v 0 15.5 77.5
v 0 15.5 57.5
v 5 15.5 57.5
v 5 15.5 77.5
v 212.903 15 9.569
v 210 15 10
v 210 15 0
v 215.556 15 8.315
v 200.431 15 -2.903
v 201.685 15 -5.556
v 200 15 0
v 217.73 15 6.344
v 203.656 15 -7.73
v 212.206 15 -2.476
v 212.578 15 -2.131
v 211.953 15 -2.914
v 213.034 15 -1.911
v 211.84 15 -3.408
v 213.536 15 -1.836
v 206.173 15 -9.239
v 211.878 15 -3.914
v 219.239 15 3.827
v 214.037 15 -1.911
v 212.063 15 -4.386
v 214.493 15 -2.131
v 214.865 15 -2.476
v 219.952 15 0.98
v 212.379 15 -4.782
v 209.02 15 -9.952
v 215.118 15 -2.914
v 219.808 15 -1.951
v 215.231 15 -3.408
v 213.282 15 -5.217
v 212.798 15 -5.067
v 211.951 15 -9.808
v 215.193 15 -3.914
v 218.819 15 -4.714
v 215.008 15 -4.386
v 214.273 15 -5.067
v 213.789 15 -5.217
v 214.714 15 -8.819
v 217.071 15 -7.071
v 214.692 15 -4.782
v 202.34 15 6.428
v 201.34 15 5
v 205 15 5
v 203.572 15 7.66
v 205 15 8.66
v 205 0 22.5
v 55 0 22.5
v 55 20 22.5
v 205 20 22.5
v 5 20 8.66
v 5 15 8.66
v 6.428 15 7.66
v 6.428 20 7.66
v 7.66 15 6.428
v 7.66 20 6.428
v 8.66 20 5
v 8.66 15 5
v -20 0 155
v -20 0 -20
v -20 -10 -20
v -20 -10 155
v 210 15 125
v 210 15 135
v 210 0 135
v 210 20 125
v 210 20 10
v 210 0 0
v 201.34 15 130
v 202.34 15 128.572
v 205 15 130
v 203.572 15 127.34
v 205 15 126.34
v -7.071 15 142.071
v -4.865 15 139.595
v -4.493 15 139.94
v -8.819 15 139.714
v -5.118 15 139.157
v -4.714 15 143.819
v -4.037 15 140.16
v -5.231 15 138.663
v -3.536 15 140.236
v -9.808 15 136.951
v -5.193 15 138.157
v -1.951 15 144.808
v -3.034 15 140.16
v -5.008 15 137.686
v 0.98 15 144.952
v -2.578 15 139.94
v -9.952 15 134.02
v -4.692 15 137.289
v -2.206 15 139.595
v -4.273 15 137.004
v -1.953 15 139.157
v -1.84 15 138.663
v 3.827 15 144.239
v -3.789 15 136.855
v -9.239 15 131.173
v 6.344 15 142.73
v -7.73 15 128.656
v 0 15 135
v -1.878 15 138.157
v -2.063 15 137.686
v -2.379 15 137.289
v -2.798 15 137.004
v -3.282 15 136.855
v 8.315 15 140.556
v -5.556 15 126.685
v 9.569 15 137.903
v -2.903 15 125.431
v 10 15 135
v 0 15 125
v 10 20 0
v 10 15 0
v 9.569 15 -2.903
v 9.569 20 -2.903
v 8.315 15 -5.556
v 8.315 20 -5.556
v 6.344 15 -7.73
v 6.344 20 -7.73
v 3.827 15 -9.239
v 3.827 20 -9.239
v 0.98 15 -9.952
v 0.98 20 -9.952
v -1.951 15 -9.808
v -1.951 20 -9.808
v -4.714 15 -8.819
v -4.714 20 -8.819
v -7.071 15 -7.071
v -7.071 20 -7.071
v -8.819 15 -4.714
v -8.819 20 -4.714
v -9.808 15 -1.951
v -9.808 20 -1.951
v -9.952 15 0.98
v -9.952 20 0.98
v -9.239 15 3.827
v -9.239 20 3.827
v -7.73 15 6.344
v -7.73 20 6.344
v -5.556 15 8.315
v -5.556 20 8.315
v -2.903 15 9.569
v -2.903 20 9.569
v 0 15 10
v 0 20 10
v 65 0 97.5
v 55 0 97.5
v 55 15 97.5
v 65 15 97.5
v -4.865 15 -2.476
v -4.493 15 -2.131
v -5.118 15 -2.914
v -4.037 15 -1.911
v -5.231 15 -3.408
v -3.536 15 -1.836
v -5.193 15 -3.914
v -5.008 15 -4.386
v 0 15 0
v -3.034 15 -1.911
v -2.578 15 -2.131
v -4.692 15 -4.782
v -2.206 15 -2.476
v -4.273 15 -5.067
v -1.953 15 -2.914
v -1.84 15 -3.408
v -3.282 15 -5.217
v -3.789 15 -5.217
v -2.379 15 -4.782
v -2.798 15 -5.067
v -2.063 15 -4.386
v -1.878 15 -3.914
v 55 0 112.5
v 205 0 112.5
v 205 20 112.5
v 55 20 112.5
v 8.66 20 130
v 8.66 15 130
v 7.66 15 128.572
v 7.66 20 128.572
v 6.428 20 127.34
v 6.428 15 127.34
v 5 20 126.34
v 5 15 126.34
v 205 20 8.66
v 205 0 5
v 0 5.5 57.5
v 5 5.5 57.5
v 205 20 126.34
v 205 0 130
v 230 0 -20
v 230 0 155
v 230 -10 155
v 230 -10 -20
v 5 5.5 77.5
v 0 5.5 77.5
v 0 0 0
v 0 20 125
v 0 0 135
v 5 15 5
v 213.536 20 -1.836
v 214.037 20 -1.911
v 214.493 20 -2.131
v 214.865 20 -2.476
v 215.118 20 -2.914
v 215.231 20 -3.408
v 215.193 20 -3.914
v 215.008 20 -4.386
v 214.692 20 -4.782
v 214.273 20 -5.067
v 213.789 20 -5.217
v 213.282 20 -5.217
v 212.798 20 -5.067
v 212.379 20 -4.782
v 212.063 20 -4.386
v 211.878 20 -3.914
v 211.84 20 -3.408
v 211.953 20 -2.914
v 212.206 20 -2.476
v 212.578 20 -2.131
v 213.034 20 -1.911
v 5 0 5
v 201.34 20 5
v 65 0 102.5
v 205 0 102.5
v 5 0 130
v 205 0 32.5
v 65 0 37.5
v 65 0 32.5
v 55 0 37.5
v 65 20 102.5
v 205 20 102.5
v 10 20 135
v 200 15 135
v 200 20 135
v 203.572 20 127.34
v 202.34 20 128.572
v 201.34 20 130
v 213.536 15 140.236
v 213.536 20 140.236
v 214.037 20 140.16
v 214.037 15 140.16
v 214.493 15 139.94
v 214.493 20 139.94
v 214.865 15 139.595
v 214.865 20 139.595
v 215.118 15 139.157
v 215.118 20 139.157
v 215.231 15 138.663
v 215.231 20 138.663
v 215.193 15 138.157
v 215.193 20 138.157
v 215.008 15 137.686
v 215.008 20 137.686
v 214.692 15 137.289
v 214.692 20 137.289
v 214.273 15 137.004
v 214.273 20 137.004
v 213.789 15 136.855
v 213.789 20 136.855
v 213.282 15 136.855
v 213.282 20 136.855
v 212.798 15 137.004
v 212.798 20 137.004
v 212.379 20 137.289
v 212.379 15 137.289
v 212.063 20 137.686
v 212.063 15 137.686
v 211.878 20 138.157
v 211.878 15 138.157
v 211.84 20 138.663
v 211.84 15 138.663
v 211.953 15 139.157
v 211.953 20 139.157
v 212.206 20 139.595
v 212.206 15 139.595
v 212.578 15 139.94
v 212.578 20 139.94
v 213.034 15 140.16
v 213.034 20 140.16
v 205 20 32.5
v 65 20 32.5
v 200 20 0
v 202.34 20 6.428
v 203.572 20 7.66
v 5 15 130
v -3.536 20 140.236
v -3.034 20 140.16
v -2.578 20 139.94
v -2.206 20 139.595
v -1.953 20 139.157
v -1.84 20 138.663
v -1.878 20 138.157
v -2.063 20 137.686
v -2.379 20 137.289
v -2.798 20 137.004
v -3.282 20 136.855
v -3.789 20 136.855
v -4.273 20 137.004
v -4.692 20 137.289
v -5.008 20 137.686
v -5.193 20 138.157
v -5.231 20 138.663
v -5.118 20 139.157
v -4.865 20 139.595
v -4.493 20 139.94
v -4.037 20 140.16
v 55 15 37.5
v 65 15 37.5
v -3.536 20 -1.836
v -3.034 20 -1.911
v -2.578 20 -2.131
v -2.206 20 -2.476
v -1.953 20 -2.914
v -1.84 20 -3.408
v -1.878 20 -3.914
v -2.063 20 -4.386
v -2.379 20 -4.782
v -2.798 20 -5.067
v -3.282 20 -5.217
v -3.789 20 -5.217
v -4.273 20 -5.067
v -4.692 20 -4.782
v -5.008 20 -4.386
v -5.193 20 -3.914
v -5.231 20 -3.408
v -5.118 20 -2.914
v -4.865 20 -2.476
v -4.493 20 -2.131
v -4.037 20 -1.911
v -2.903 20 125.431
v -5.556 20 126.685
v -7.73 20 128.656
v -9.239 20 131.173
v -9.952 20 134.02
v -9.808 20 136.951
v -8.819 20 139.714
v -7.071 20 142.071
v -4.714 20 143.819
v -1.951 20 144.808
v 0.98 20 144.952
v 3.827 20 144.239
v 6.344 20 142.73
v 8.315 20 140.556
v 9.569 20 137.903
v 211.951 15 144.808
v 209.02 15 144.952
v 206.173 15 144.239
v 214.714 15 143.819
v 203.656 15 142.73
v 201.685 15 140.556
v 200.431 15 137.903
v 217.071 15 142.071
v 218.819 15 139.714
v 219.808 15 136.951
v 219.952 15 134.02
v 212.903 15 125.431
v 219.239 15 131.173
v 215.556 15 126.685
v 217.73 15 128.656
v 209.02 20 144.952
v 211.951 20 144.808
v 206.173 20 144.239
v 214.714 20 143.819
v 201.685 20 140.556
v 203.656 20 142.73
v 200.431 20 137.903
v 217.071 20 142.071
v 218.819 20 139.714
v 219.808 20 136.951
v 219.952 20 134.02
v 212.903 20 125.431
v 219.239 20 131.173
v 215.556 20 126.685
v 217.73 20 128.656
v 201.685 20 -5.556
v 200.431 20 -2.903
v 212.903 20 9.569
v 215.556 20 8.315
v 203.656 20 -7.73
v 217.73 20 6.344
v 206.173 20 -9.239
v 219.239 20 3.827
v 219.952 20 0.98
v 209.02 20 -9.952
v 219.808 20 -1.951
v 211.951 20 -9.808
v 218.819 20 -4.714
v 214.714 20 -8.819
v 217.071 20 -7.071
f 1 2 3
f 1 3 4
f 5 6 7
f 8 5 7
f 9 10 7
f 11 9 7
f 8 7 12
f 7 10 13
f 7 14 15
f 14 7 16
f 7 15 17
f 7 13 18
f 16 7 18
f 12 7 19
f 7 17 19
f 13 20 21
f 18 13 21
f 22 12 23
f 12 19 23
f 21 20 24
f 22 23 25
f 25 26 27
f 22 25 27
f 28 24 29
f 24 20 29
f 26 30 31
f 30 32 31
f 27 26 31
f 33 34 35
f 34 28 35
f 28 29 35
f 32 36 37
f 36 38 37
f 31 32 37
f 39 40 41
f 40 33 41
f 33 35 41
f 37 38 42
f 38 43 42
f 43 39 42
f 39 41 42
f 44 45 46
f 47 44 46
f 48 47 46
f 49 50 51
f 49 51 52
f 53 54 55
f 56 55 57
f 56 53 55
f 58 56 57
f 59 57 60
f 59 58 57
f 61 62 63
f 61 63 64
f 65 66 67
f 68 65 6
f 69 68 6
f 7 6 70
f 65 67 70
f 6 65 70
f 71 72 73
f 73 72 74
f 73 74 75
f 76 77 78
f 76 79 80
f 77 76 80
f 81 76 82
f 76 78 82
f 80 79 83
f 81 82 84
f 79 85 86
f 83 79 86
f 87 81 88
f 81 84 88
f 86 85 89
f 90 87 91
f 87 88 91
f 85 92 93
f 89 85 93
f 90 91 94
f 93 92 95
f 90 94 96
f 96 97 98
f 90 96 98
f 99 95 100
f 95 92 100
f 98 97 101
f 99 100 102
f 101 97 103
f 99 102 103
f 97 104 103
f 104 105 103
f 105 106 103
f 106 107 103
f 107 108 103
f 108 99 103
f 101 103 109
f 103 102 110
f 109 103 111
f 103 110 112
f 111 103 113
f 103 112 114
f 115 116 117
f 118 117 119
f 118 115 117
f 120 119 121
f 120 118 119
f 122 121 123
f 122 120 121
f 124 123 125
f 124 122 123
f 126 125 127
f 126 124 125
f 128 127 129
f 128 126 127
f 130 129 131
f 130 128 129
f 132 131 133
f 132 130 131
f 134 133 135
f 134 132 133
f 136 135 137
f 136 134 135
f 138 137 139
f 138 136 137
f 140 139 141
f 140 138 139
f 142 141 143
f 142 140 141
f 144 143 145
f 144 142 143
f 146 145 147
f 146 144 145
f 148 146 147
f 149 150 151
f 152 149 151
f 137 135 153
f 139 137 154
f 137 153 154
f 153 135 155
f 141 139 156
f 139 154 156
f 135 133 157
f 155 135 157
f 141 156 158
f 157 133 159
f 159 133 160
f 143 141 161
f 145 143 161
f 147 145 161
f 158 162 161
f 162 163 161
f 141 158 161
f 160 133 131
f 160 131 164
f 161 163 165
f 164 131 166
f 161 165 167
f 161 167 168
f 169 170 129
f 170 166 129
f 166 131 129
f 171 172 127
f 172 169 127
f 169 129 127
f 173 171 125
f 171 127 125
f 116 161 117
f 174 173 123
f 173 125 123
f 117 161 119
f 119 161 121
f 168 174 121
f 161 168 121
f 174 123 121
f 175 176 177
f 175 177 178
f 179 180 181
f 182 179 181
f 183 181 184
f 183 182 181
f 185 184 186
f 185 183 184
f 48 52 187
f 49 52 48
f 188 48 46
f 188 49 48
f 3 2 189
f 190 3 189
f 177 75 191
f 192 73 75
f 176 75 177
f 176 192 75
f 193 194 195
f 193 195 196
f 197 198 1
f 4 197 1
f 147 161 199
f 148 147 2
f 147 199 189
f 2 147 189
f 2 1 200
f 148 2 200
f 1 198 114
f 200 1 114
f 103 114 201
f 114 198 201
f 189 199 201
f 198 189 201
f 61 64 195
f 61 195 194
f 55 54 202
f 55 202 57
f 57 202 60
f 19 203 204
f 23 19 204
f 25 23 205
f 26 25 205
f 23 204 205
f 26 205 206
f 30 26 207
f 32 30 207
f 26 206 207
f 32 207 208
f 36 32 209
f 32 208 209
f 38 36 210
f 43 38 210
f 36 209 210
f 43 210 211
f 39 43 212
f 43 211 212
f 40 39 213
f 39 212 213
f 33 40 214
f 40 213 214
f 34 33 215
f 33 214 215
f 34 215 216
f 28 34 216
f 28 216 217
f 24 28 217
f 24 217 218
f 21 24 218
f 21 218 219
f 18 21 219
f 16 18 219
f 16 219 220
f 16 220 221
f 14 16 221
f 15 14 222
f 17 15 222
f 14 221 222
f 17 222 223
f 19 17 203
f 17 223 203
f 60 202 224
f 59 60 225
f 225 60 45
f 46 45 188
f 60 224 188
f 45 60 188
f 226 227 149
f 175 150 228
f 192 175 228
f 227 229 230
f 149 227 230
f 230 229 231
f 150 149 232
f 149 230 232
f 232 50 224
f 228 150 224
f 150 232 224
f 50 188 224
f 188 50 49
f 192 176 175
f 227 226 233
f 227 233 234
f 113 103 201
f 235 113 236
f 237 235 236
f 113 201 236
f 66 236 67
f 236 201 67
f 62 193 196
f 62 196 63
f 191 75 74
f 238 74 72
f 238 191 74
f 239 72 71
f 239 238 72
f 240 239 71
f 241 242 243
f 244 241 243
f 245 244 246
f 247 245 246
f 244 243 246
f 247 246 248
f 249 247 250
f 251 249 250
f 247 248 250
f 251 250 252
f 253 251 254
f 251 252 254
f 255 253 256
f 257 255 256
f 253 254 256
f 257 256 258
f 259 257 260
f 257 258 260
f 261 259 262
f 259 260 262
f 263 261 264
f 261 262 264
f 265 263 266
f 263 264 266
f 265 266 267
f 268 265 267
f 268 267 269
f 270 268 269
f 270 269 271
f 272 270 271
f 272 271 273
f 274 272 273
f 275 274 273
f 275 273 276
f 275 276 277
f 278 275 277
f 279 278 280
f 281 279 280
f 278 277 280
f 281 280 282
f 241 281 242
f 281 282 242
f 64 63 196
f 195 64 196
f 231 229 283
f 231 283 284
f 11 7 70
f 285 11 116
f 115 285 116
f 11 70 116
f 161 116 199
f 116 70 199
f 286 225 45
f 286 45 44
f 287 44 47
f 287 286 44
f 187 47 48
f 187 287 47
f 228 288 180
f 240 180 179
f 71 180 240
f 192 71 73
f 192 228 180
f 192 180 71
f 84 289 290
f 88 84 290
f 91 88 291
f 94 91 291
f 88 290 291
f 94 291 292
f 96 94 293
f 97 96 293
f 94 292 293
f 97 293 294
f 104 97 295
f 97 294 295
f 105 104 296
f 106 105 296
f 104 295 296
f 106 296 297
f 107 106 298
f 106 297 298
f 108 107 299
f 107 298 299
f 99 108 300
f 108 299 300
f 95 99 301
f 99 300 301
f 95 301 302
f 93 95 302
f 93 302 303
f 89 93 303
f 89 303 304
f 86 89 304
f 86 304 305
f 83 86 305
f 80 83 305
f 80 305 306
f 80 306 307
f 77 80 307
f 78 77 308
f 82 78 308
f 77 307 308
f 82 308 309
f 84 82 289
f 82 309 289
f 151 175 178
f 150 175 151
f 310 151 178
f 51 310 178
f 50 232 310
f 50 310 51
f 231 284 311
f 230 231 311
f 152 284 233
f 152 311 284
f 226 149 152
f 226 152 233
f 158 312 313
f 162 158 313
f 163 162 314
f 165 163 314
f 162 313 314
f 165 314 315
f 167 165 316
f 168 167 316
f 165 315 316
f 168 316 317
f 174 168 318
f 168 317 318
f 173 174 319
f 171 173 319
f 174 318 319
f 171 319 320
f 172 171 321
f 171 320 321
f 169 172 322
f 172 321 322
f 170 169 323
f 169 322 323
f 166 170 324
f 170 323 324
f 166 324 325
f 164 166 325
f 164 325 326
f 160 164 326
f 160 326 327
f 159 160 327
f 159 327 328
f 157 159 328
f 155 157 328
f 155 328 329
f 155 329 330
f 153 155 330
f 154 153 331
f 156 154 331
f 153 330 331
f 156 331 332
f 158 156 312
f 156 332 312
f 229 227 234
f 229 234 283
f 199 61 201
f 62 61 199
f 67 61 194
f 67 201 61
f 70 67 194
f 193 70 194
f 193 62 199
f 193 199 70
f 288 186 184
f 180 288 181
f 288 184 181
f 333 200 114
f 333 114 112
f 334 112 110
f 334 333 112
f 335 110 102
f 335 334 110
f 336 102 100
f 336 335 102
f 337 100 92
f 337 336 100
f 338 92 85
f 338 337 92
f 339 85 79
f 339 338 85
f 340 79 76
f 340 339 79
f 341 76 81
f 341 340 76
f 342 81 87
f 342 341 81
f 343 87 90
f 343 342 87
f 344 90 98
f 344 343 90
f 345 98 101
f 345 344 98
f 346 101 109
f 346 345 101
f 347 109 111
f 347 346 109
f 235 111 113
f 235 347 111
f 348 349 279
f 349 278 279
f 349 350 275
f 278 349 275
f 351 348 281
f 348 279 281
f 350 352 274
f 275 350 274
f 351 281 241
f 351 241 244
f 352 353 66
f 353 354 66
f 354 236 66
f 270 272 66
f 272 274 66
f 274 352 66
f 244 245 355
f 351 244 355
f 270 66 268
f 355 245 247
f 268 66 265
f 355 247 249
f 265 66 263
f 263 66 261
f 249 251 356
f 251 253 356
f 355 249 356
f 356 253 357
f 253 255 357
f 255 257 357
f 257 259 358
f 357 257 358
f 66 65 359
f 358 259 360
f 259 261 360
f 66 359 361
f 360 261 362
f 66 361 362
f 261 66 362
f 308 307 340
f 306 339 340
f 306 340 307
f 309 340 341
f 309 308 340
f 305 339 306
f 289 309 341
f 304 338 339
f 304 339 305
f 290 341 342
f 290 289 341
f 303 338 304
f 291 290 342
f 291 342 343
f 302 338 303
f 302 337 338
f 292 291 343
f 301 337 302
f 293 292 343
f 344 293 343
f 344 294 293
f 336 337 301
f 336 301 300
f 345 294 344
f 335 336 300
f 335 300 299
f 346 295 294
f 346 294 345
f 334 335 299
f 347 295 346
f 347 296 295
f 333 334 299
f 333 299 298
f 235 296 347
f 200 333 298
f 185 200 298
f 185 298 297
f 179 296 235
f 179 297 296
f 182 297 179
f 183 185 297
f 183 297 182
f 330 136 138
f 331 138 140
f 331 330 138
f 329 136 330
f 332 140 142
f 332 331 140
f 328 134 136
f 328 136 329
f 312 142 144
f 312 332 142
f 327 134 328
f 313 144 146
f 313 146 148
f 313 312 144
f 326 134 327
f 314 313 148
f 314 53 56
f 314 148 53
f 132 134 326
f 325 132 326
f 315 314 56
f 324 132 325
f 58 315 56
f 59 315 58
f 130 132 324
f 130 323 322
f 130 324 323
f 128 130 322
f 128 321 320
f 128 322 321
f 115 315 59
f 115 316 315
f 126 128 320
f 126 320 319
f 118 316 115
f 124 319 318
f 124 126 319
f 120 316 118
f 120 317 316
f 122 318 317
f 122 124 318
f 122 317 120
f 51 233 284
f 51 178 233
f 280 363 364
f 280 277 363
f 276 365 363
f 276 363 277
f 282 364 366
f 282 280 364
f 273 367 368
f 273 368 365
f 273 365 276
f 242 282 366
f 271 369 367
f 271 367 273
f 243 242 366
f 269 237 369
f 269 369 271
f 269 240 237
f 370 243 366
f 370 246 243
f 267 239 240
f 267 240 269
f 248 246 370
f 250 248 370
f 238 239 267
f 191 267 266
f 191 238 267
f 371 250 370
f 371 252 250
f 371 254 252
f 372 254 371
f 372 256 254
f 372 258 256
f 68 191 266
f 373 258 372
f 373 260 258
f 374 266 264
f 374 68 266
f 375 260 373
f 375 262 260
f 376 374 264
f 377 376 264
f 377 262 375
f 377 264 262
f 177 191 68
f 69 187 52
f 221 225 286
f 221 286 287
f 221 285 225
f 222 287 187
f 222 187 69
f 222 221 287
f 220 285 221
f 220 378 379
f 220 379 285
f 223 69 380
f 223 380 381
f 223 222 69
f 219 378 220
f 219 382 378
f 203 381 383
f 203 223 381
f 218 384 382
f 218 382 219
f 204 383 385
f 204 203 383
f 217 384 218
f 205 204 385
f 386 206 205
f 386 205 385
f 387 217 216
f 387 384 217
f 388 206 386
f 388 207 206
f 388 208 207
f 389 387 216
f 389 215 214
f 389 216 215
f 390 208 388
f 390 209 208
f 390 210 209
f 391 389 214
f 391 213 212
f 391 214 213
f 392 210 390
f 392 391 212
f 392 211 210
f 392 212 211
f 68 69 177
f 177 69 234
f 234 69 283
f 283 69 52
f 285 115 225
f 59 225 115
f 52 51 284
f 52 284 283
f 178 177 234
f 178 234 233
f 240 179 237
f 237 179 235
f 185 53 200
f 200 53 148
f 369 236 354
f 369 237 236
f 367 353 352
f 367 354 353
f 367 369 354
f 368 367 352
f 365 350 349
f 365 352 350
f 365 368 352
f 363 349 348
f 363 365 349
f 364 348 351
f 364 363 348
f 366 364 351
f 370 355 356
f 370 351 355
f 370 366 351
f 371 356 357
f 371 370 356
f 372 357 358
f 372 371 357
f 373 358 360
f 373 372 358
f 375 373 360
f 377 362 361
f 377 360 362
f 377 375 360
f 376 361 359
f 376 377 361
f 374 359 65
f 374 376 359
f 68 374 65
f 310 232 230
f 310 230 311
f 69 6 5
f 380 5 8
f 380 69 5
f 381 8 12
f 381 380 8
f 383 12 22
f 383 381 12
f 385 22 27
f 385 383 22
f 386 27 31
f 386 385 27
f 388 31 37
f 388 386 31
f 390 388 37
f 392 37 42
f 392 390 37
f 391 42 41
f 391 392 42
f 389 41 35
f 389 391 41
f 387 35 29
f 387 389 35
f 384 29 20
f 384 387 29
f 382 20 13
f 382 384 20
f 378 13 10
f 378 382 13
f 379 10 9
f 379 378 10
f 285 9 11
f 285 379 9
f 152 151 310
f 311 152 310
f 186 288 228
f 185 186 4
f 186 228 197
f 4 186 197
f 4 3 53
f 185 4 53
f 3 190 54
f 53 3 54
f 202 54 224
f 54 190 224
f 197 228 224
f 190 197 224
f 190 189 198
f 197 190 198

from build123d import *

# Parameters (mm, degrees)
SKETCH1_W           = 200
SKETCH1_H           = 125
BOSS_EXTRUDE3_DEPTH = 40
BOSS_EXTRUDE4_DEPTH = 10
EXTRUDE_THIN1_DEPTH = 40
SKETCH5_W           = 30
SKETCH5_H           = 15
CUT_EXTRUDE2_DEPTH  = 40
SKETCH6_W           = 210
SKETCH6_H           = 135
CUT_EXTRUDE3_DEPTH  = 20
SKETCH7_R           = 10
BOSS_EXTRUDE5_DEPTH = 5
SKETCH8_R           = 1.7
CUT_EXTRUDE5_DEPTH  = 5
SKETCH9_W           = 10
SKETCH9_H           = 5
CUT_EXTRUDE6_DEPTH  = 10
SKETCH10_W          = 230
SKETCH10_H          = 155
BOSS_EXTRUDE6_DEPTH = 10
SKETCH12_W          = 70
SKETCH12_H          = 10
CUT_EXTRUDE7_DEPTH  = 250


with BuildPart() as part:
    # Sketch1 → Boss-Extrude3 (new body)
    with BuildSketch(Plane(origin=(0, 0, 0), x_dir=(1, 0, 0), z_dir=(0, 1, 0))):
        Polygon((5, 0), (0, 0), (0, -135), (210, -135), (210, 0), align=None)
        with Locations((105, -67.5)):
            Rectangle(SKETCH1_W, SKETCH1_H, mode=Mode.SUBTRACT)
    extrude(amount=BOSS_EXTRUDE3_DEPTH)

    # Sketch3 → Boss-Extrude4 (add)
    with BuildSketch(Plane(origin=(0, 0, 0), x_dir=(-1, 0, 0), z_dir=(0, -1, 0))):
        Polygon((-220, -145), (0, -145), (10, -145), (10, 10), (-220, 10), align=None)
    extrude(amount=BOSS_EXTRUDE4_DEPTH)

    # Sketch4 → Extrude-Thin1 (add)
    with BuildSketch(Plane(origin=(0, 0, 0), x_dir=(1, 0, 0), z_dir=(0, 1, 0))):
        Polygon((205, -32.5), (65, -32.5), (65, -102.5), (205, -102.5), (205, -112.5), (55, -112.5), (55, -22.5), (205, -22.5), align=None)
    extrude(amount=EXTRUDE_THIN1_DEPTH)

    # Sketch5 → Cut-Extrude2 (cut)
    with BuildSketch(Plane.ZY.offset(-55)):
        with Locations((82.5, 7.5)):
            Rectangle(SKETCH5_W, SKETCH5_H)
        with Locations((52.5, 7.5)):
            Rectangle(SKETCH5_W, SKETCH5_H)
    extrude(amount=-CUT_EXTRUDE2_DEPTH, mode=Mode.SUBTRACT)

    # Sketch6 → Cut-Extrude3 (cut)
    with BuildSketch(Plane(origin=(0, 40, 0), x_dir=(1, 0, 0), z_dir=(0, 1, 0))):
        with Locations((105, -67.5)):
            Rectangle(SKETCH6_W, SKETCH6_H)
    extrude(amount=-CUT_EXTRUDE3_DEPTH, mode=Mode.SUBTRACT)

    # Sketch7 → Boss-Extrude5 (add)
    with BuildSketch(Plane(origin=(0, 20, 0), x_dir=(1, 0, 0), z_dir=(0, 1, 0))):
        Circle(SKETCH7_R)
        with Locations((210, 0)):
            Circle(SKETCH7_R)
        with Locations((210, -135)):
            Circle(SKETCH7_R)
        with Locations((0, -135)):
            Circle(SKETCH7_R)
    extrude(amount=-BOSS_EXTRUDE5_DEPTH)

    # Sketch8 → Cut-Extrude5 (cut)
    with BuildSketch(Plane(origin=(0, 20, 0), x_dir=(1, 0, 0), z_dir=(0, 1, 0))):
        with Locations(Location((-3.535533906, 3.535533906, 0), (0, 0, 270))):
            Circle(SKETCH8_R)
        with Locations(Location((213.535533906, 3.535533906, 0), (0, 0, 270))):
            Circle(SKETCH8_R)
        with Locations(Location((213.535533906, -138.535533906, 0), (0, 0, 270))):
            Circle(SKETCH8_R)
        with Locations(Location((-3.535533906, -138.535533906, 0), (0, 0, 270))):
            Circle(SKETCH8_R)
    extrude(amount=-CUT_EXTRUDE5_DEPTH, mode=Mode.SUBTRACT)

    # Sketch9 → Cut-Extrude6 (cut)
    with BuildSketch(Plane.ZY):
        Polygon((77.5, 15.5), (77.5, 10.5), (67.5, 10.5), (57.5, 10.5), (57.5, 15.5), align=None)
        with Locations((72.5, 8)):
            Rectangle(SKETCH9_W, SKETCH9_H)
        with Locations((62.5, 8)):
            Rectangle(SKETCH9_W, SKETCH9_H)
    extrude(amount=-CUT_EXTRUDE6_DEPTH, mode=Mode.SUBTRACT)

    # Sketch10 → Boss-Extrude6 (add)
    with BuildSketch(Plane(origin=(0, 0, 0), x_dir=(1, 0, 0), z_dir=(0, 1, 0))):
        Polygon((230, 20), (-10, 20), (-20, 20), (-20, -225), (230, -225), align=None)
        with Locations((105, -67.5)):
            Rectangle(SKETCH10_W, SKETCH10_H, mode=Mode.SUBTRACT)
    extrude(amount=-BOSS_EXTRUDE6_DEPTH)

    # Sketch12 → Cut-Extrude7 (cut)
    with BuildSketch(Plane.ZY.offset(20)):
        with Locations((190, -5)):
            Rectangle(SKETCH12_W, SKETCH12_H)
    extrude(amount=-CUT_EXTRUDE7_DEPTH, mode=Mode.SUBTRACT)


solid = part.part
